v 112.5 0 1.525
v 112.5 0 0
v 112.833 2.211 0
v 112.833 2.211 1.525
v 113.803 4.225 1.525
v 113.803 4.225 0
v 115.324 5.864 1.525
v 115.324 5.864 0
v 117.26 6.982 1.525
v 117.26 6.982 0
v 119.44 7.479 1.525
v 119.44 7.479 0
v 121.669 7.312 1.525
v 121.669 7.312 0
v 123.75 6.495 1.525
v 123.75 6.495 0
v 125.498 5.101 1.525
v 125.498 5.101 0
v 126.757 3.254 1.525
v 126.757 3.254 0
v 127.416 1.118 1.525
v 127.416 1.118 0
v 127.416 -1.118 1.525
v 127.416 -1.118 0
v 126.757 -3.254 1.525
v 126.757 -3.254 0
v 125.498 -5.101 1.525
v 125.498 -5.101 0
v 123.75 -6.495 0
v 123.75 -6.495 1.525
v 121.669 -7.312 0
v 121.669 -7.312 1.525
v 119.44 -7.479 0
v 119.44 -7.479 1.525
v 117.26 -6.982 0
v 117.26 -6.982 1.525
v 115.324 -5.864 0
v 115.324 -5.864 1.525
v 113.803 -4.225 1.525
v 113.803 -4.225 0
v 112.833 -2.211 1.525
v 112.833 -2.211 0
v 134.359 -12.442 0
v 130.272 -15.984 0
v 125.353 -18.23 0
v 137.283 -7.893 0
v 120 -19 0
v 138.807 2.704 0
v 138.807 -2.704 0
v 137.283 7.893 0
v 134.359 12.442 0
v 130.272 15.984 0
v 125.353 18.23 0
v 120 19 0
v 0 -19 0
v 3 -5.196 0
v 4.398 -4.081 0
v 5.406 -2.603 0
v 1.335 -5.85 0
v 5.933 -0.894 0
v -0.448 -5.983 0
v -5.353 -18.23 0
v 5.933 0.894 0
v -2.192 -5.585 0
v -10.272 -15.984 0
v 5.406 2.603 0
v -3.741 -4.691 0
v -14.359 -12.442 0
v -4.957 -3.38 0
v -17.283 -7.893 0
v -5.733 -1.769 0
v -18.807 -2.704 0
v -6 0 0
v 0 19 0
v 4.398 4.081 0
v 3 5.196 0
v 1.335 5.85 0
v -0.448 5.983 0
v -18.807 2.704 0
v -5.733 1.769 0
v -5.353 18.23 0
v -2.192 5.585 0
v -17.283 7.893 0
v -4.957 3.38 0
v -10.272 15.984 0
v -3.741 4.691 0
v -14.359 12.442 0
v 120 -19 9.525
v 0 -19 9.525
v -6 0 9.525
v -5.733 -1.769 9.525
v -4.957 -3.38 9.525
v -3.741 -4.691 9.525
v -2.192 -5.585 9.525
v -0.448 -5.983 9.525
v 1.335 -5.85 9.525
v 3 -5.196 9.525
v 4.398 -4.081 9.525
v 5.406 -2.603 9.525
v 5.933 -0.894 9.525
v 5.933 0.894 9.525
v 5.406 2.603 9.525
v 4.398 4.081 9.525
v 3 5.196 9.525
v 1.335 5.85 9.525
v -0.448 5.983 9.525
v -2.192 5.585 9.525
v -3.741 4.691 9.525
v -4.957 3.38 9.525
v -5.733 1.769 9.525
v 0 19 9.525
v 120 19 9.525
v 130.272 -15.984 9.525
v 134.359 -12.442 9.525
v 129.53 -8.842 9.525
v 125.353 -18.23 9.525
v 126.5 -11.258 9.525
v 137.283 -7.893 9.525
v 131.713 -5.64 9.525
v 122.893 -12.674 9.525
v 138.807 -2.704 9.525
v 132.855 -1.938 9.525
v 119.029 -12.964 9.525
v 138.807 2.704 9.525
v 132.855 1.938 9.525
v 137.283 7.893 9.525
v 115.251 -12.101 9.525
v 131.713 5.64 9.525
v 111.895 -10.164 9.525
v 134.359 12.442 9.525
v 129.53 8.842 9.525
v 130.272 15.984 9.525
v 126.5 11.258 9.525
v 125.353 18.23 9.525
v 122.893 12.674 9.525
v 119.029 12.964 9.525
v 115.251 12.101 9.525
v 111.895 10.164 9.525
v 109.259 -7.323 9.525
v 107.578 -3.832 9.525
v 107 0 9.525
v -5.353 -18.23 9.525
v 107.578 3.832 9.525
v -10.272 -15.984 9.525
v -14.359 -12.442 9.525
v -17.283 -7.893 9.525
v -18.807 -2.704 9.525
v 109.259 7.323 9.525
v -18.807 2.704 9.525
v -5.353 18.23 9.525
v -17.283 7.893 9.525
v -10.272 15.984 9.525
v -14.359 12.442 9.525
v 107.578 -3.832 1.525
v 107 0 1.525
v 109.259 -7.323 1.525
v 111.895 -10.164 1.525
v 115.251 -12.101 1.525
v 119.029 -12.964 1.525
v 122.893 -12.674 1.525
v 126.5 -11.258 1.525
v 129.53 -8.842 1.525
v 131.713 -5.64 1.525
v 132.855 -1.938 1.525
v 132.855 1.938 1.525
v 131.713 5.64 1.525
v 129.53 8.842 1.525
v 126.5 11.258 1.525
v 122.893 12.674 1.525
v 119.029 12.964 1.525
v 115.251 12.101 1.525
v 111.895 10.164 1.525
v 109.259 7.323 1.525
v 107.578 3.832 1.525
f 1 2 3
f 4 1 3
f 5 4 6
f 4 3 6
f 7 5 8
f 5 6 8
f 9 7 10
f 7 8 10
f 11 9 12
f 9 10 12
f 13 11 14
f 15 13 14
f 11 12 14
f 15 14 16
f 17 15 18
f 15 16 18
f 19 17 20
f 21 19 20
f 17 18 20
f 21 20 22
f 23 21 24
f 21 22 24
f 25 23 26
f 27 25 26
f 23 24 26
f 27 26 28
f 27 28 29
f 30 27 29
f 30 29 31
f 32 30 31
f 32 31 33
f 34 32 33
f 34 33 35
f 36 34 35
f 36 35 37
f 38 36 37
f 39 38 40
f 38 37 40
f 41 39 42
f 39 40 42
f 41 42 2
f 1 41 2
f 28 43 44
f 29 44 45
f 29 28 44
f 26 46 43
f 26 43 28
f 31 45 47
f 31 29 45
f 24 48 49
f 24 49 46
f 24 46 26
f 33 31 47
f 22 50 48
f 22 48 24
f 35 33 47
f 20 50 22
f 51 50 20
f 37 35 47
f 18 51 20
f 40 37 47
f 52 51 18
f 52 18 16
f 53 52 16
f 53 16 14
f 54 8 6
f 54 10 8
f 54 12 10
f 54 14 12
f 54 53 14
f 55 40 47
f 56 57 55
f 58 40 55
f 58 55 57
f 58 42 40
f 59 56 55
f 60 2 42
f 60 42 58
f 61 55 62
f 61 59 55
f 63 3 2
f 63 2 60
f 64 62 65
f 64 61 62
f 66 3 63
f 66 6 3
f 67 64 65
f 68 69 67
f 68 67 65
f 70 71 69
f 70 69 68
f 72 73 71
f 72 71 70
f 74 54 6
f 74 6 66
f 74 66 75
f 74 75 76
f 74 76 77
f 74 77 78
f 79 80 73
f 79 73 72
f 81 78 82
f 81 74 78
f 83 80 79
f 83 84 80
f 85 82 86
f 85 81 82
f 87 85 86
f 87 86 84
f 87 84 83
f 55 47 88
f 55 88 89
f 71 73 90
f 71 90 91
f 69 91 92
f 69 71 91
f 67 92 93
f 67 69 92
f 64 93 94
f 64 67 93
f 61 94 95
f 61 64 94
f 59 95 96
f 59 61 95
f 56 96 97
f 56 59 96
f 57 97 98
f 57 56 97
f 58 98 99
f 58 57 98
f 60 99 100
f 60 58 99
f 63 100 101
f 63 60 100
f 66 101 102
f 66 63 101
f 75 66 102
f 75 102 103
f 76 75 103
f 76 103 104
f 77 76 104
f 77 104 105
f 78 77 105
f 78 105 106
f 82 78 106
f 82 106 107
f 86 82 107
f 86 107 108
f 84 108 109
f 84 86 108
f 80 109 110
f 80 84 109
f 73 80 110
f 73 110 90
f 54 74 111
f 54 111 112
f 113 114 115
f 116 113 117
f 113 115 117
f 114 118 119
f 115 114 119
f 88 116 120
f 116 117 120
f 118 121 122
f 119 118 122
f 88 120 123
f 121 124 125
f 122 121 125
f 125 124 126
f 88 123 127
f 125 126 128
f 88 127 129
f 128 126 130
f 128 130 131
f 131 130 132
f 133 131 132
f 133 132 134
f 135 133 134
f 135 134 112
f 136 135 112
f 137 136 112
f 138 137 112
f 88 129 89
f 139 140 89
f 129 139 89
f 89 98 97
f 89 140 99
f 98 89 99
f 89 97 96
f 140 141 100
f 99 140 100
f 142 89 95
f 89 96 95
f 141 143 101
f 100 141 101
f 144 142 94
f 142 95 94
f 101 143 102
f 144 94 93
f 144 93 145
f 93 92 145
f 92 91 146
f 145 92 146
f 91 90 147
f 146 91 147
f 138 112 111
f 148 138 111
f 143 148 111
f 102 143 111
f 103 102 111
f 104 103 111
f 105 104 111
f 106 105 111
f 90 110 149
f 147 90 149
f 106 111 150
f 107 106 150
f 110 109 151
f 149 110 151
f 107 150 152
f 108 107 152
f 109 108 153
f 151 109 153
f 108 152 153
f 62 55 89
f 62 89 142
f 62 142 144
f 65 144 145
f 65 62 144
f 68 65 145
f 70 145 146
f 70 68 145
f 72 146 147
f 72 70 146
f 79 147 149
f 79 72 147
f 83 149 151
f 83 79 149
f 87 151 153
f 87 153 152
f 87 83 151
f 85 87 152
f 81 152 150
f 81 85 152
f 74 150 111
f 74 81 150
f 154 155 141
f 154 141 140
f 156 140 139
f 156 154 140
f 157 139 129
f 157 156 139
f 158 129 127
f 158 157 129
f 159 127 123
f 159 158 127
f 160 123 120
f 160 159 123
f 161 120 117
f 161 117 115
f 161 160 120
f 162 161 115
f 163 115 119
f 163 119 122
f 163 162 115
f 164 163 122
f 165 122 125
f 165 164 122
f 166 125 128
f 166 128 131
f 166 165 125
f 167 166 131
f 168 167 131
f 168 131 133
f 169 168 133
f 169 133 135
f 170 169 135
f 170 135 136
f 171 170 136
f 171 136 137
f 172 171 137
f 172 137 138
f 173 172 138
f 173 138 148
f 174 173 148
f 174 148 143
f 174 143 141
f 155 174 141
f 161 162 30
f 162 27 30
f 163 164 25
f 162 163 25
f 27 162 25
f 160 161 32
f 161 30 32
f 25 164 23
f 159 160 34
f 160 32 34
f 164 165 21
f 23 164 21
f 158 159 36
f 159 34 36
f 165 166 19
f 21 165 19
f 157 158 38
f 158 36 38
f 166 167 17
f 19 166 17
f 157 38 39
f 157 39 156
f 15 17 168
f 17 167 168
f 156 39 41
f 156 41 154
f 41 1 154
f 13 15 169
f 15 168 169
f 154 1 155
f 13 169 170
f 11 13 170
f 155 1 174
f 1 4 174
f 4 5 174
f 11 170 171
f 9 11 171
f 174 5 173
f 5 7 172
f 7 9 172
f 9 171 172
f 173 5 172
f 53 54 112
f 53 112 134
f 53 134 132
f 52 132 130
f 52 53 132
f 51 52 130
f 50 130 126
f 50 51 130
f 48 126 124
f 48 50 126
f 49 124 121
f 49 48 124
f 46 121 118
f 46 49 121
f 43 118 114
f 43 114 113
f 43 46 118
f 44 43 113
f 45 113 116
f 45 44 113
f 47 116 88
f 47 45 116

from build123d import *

# Parameters (mm, degrees)
CROQUIS1_R              = 6
CROQUIS1_R_2            = 13
SALIENTE_EXTRUIR1_DEPTH = 9.525
CROQUIS2_R              = 13
CROQUIS2_R_2            = 7.5
SALIENTE_EXTRUIR2_DEPTH = 1.525


with BuildPart() as part:
    # Croquis1 → Saliente-Extruir1 (new body)
    with BuildSketch(Plane.XY):
        with BuildLine():
            Line((0, 19), (120, 19))
            ThreePointArc((120, 19), (139, 0), (120, -19))
            Line((120, -19), (0, -19))
            ThreePointArc((0, -19), (-19, 0), (0, 19))
        make_face()
        with Locations(Location((0, 0, 0), (0, 0, 180))):
            Circle(CROQUIS1_R, mode=Mode.SUBTRACT)
        with Locations(Location((120, 0, 0), (0, 0, 180))):
            Circle(CROQUIS1_R_2, mode=Mode.SUBTRACT)
    extrude(amount=SALIENTE_EXTRUIR1_DEPTH)

    # Croquis2 → Saliente-Extruir2 (add)
    with BuildSketch(Plane(origin=(0, 0, 0), x_dir=(-1, 0, 0), z_dir=(0, 0, -1))):
        with Locations((-120, 0)):
            Circle(CROQUIS2_R)
        with Locations((-120, 0)):
            Circle(CROQUIS2_R_2, mode=Mode.SUBTRACT)
    extrude(amount=-SALIENTE_EXTRUIR2_DEPTH)


solid = part.part
